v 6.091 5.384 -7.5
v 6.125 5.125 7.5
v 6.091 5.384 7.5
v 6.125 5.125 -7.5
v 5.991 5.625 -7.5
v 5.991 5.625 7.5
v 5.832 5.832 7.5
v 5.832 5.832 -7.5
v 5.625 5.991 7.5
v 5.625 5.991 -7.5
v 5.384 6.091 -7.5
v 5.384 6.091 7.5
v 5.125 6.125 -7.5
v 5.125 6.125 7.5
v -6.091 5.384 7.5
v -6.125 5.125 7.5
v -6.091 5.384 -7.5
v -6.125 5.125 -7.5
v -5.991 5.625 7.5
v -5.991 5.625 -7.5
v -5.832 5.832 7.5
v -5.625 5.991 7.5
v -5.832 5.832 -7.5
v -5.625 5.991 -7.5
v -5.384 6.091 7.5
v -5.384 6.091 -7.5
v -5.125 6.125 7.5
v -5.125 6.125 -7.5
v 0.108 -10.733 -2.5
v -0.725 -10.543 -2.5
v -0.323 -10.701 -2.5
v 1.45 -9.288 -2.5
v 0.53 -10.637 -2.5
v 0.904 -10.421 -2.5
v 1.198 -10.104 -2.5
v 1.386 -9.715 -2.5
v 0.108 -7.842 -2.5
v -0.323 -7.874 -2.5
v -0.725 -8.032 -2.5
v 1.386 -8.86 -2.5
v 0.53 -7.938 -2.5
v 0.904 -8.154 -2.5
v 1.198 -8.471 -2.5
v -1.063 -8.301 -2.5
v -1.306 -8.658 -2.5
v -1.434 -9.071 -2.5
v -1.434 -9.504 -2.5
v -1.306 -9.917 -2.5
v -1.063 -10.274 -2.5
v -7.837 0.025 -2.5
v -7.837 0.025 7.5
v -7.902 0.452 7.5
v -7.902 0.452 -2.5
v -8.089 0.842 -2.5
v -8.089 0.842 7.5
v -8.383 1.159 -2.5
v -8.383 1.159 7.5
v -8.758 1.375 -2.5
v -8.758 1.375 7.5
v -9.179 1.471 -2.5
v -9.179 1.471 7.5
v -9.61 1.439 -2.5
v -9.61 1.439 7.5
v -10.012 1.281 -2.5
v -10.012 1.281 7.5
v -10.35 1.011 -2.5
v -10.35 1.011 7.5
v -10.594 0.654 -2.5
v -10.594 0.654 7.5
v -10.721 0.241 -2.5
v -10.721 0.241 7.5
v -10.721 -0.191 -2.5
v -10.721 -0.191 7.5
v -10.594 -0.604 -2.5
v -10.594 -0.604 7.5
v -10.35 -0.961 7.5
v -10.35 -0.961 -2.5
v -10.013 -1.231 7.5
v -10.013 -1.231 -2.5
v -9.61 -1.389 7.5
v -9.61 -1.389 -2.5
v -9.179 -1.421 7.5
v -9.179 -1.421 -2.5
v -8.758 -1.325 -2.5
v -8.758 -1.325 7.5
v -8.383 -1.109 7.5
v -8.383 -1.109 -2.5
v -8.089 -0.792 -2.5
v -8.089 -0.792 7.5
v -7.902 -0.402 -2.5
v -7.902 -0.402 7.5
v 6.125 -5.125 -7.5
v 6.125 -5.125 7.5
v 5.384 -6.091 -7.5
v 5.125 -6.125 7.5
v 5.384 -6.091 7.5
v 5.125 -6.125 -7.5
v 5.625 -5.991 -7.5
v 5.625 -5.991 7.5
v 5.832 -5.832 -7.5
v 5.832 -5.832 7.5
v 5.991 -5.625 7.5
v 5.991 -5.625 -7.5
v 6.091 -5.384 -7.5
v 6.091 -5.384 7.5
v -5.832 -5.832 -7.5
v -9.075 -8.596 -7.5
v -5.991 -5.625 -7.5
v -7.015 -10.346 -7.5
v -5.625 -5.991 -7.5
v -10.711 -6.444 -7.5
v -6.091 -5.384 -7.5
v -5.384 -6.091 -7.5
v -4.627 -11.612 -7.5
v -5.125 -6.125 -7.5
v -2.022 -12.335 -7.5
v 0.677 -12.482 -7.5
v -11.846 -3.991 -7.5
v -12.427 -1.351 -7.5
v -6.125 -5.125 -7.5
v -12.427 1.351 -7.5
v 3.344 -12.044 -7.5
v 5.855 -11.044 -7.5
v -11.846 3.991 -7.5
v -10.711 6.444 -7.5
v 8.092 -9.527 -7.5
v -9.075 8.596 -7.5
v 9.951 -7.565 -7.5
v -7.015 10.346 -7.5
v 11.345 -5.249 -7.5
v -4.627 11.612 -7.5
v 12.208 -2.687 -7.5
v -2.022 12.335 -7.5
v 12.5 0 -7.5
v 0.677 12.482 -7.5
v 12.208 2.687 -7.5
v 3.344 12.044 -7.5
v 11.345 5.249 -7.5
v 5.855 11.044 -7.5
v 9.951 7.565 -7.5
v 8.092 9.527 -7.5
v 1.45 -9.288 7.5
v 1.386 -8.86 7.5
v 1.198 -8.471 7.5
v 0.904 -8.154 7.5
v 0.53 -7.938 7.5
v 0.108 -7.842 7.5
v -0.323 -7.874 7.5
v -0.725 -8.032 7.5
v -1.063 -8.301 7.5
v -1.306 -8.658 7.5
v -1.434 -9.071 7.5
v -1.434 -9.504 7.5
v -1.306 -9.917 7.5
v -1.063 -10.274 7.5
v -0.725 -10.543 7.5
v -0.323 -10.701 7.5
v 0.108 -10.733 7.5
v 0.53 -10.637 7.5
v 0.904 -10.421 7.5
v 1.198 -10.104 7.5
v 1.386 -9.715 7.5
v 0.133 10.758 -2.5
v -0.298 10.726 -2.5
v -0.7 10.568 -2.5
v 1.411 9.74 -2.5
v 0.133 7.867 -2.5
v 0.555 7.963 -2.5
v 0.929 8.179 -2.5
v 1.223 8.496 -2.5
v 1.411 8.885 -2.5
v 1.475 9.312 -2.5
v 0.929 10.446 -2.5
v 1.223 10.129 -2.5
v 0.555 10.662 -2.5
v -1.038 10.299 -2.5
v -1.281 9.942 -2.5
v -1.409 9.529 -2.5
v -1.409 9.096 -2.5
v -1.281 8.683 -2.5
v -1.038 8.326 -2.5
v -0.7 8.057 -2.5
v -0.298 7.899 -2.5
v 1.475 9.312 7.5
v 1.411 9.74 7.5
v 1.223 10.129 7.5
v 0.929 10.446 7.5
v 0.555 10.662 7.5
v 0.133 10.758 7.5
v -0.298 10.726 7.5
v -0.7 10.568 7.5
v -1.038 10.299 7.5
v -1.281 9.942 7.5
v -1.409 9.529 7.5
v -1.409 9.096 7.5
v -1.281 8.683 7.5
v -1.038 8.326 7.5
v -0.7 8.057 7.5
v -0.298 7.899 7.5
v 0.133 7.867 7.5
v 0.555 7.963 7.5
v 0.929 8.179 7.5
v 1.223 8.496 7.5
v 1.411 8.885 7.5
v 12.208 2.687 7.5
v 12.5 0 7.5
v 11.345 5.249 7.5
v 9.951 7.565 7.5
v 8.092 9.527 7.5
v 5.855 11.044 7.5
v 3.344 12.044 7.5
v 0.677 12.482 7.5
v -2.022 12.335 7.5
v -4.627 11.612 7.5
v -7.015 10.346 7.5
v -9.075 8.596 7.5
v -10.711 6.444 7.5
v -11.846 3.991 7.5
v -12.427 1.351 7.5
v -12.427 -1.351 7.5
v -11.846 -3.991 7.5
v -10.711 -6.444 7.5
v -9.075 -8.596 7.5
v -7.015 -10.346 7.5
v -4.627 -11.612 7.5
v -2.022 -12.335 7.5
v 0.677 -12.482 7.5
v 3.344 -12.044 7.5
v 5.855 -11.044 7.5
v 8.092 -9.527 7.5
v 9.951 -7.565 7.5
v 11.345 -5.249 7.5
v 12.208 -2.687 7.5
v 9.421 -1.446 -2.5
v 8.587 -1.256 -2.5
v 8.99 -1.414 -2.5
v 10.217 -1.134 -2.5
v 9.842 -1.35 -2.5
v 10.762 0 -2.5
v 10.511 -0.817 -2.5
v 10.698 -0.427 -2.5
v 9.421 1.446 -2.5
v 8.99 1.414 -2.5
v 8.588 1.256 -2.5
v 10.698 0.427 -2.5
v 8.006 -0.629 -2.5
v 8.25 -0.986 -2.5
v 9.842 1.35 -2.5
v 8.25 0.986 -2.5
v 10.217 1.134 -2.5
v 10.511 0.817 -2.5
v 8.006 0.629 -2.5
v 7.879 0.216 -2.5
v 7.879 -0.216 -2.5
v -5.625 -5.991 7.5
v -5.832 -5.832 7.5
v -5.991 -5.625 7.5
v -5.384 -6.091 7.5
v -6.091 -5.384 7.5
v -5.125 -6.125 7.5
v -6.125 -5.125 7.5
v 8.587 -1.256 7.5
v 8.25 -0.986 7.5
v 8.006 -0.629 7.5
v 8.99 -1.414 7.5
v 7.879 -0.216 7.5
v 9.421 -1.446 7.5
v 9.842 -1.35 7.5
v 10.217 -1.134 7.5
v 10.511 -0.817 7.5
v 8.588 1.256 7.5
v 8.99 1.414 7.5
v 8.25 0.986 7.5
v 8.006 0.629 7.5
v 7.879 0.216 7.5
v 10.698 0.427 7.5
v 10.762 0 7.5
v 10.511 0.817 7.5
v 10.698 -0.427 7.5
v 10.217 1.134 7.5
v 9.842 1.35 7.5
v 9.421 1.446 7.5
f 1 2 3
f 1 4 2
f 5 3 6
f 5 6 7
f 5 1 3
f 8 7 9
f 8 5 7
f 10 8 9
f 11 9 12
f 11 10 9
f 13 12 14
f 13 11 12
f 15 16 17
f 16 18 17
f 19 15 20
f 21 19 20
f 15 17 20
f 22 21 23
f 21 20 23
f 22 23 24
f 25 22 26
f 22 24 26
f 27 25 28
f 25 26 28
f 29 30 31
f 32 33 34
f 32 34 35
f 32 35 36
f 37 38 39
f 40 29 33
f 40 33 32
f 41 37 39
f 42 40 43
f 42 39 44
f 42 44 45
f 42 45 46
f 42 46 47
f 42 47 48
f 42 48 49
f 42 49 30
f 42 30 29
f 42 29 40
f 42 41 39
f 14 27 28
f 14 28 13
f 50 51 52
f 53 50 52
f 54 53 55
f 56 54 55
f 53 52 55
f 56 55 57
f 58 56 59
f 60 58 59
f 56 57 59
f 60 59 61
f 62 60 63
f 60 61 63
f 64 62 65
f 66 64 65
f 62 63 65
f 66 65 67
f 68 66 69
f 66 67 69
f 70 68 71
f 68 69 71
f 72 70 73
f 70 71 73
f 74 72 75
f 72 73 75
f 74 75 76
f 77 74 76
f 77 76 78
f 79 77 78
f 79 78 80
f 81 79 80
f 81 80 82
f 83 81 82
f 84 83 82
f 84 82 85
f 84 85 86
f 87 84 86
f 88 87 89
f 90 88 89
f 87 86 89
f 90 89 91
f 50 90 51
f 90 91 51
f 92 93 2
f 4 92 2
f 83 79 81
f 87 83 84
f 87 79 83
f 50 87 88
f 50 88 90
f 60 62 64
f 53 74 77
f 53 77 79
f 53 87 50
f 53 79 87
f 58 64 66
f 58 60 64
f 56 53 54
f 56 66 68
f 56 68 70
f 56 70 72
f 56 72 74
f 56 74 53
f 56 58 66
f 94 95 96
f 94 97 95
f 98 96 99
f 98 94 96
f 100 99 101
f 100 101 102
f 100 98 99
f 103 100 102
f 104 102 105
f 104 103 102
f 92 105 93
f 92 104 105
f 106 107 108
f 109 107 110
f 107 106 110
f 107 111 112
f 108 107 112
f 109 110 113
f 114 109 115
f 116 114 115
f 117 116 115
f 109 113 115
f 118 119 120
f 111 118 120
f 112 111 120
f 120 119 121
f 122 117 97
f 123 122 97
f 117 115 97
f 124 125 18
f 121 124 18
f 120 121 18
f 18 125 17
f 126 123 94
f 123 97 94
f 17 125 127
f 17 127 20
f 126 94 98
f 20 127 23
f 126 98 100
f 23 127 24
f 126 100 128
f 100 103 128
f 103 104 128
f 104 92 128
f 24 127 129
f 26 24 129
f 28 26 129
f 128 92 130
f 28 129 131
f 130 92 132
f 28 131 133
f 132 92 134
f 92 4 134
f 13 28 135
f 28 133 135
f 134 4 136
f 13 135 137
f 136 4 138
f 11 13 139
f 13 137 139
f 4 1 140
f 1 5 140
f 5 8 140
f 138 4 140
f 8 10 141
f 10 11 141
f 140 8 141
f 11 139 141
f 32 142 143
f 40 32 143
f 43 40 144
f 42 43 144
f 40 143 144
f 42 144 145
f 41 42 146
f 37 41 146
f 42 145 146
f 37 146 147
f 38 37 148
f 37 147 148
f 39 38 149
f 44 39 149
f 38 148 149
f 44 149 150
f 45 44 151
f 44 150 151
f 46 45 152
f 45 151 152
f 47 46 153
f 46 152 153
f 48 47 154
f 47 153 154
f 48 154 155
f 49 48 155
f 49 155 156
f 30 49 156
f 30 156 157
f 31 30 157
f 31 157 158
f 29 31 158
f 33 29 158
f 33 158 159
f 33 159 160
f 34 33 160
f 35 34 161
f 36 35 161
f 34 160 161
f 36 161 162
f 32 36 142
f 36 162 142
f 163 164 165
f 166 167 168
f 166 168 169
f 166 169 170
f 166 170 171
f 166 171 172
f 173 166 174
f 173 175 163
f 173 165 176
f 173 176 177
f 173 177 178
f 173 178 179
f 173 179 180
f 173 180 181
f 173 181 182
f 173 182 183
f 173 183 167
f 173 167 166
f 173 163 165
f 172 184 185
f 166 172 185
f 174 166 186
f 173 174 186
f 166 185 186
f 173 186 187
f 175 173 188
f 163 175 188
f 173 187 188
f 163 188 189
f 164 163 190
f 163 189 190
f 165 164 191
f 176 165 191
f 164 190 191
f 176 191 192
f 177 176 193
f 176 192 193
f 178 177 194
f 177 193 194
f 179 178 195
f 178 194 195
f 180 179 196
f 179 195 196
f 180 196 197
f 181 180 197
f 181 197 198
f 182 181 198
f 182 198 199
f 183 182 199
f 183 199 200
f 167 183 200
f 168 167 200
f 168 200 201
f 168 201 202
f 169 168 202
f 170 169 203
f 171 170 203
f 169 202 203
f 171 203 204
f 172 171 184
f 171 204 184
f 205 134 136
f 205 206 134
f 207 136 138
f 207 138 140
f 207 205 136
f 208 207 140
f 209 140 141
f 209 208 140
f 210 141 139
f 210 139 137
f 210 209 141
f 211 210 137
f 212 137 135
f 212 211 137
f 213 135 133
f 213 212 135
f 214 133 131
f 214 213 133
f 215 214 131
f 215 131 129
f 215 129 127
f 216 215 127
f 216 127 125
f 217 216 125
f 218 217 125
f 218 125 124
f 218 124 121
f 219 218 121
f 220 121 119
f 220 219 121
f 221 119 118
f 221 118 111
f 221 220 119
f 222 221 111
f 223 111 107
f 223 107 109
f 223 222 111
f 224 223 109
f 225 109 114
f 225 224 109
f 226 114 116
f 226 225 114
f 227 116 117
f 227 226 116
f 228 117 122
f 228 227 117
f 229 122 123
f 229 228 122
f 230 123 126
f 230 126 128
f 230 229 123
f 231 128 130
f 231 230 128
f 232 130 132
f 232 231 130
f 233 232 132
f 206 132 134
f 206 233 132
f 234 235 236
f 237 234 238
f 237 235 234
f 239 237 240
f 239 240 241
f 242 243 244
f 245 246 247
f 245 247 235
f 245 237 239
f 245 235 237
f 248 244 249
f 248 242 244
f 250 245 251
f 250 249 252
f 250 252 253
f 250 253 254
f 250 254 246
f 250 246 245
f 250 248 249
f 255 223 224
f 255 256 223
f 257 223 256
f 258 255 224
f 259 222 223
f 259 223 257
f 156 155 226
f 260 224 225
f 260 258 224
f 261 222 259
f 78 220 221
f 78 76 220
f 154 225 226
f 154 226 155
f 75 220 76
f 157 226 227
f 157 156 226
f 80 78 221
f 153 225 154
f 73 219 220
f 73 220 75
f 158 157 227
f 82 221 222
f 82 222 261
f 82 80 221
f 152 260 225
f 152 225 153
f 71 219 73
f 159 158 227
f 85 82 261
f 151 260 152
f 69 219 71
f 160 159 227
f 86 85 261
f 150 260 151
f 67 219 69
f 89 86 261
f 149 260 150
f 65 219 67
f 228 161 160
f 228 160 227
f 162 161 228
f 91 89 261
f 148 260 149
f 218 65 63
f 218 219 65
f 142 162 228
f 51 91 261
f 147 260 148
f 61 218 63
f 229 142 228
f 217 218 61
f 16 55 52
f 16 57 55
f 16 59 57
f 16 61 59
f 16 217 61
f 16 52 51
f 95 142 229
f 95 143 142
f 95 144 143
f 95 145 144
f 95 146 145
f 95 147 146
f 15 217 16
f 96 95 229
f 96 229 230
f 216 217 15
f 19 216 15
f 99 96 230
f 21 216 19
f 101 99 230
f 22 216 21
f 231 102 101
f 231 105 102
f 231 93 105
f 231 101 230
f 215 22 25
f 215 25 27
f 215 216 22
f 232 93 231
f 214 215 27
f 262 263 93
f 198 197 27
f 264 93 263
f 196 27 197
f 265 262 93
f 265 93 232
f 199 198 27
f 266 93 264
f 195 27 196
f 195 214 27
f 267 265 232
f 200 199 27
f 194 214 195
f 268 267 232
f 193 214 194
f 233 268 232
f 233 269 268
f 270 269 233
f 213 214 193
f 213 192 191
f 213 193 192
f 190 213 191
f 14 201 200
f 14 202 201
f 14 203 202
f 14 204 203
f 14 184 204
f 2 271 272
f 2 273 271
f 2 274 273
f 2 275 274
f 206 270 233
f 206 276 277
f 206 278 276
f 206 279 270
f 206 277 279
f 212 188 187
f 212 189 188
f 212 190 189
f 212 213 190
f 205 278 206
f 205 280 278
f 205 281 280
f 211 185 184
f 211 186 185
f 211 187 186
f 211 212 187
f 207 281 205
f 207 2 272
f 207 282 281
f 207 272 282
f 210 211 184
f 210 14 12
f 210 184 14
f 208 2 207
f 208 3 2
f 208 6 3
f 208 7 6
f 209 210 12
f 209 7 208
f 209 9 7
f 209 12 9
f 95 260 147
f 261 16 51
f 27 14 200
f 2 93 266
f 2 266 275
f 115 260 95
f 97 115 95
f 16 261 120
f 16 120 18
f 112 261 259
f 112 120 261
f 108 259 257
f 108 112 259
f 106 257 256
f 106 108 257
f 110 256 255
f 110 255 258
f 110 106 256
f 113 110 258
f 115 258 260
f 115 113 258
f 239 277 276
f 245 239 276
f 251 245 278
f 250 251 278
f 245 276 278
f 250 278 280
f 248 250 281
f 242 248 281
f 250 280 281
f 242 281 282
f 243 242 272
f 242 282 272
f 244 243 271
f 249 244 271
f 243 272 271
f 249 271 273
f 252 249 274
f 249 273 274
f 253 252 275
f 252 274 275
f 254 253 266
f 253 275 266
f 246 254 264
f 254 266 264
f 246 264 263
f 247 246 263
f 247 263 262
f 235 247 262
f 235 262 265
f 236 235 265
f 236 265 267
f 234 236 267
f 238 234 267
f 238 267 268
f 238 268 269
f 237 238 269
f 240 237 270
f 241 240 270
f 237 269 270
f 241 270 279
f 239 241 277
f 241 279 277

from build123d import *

# Parameters (mm, degrees)
SKETCH1_R           = 12.5
BOSS_EXTRUDE1_DEPTH = 7.5
CUT_EXTRUDE3_REACH  = 25.184
SKETCH8_W           = 12.25
SKETCH8_H           = 12.25
SKETCH9_R           = 1.45
CUT_EXTRUDE4_DEPTH  = 10
FILLET1_R           = 1


with BuildPart() as part:
    # Sketch1 → Boss-Extrude1 (new, symmetric)
    with BuildSketch(Plane.XY):
        Circle(SKETCH1_R)
    extrude(amount=BOSS_EXTRUDE1_DEPTH, both=True)

    # Sketch8 → Cut-Extrude3 (cut, up to next)
    with BuildSketch(Plane.XY.offset(7.5), mode=Mode.PRIVATE) as cut_extrude3_sk1:
        Rectangle(SKETCH8_W, SKETCH8_H)
    cut_extrude3_tool1 = extrude(cut_extrude3_sk1.sketch, amount=-CUT_EXTRUDE3_REACH, mode=Mode.PRIVATE) & part.part
    add(cut_extrude3_tool1.solids().sort_by_distance((0, 0, 7.5))[0], mode=Mode.SUBTRACT)

    # Sketch9 → Cut-Extrude4 (cut)
    with BuildSketch(Plane.XY.offset(7.5)):
        with Locations((9.3125, 0)):
            Circle(SKETCH9_R)
        with Locations((0, -9.2875)):
            Circle(SKETCH9_R)
        with Locations((-9.2875, 0.025)):
            Circle(SKETCH9_R)
        with Locations((0.025, 9.3125)):
            Circle(SKETCH9_R)
    extrude(amount=-CUT_EXTRUDE4_DEPTH, mode=Mode.SUBTRACT)

    # Fillet1
    fillet1_edges = [part.edges().sort_by_distance(p)[0] for p in [
        (6.125, 6.125, 0),
        (6.125, -6.125, 0),
        (-6.125, -6.125, 0),
        (-6.125, 6.125, 0),
    ]]
    fillet(fillet1_edges, radius=FILLET1_R)


solid = part.part
